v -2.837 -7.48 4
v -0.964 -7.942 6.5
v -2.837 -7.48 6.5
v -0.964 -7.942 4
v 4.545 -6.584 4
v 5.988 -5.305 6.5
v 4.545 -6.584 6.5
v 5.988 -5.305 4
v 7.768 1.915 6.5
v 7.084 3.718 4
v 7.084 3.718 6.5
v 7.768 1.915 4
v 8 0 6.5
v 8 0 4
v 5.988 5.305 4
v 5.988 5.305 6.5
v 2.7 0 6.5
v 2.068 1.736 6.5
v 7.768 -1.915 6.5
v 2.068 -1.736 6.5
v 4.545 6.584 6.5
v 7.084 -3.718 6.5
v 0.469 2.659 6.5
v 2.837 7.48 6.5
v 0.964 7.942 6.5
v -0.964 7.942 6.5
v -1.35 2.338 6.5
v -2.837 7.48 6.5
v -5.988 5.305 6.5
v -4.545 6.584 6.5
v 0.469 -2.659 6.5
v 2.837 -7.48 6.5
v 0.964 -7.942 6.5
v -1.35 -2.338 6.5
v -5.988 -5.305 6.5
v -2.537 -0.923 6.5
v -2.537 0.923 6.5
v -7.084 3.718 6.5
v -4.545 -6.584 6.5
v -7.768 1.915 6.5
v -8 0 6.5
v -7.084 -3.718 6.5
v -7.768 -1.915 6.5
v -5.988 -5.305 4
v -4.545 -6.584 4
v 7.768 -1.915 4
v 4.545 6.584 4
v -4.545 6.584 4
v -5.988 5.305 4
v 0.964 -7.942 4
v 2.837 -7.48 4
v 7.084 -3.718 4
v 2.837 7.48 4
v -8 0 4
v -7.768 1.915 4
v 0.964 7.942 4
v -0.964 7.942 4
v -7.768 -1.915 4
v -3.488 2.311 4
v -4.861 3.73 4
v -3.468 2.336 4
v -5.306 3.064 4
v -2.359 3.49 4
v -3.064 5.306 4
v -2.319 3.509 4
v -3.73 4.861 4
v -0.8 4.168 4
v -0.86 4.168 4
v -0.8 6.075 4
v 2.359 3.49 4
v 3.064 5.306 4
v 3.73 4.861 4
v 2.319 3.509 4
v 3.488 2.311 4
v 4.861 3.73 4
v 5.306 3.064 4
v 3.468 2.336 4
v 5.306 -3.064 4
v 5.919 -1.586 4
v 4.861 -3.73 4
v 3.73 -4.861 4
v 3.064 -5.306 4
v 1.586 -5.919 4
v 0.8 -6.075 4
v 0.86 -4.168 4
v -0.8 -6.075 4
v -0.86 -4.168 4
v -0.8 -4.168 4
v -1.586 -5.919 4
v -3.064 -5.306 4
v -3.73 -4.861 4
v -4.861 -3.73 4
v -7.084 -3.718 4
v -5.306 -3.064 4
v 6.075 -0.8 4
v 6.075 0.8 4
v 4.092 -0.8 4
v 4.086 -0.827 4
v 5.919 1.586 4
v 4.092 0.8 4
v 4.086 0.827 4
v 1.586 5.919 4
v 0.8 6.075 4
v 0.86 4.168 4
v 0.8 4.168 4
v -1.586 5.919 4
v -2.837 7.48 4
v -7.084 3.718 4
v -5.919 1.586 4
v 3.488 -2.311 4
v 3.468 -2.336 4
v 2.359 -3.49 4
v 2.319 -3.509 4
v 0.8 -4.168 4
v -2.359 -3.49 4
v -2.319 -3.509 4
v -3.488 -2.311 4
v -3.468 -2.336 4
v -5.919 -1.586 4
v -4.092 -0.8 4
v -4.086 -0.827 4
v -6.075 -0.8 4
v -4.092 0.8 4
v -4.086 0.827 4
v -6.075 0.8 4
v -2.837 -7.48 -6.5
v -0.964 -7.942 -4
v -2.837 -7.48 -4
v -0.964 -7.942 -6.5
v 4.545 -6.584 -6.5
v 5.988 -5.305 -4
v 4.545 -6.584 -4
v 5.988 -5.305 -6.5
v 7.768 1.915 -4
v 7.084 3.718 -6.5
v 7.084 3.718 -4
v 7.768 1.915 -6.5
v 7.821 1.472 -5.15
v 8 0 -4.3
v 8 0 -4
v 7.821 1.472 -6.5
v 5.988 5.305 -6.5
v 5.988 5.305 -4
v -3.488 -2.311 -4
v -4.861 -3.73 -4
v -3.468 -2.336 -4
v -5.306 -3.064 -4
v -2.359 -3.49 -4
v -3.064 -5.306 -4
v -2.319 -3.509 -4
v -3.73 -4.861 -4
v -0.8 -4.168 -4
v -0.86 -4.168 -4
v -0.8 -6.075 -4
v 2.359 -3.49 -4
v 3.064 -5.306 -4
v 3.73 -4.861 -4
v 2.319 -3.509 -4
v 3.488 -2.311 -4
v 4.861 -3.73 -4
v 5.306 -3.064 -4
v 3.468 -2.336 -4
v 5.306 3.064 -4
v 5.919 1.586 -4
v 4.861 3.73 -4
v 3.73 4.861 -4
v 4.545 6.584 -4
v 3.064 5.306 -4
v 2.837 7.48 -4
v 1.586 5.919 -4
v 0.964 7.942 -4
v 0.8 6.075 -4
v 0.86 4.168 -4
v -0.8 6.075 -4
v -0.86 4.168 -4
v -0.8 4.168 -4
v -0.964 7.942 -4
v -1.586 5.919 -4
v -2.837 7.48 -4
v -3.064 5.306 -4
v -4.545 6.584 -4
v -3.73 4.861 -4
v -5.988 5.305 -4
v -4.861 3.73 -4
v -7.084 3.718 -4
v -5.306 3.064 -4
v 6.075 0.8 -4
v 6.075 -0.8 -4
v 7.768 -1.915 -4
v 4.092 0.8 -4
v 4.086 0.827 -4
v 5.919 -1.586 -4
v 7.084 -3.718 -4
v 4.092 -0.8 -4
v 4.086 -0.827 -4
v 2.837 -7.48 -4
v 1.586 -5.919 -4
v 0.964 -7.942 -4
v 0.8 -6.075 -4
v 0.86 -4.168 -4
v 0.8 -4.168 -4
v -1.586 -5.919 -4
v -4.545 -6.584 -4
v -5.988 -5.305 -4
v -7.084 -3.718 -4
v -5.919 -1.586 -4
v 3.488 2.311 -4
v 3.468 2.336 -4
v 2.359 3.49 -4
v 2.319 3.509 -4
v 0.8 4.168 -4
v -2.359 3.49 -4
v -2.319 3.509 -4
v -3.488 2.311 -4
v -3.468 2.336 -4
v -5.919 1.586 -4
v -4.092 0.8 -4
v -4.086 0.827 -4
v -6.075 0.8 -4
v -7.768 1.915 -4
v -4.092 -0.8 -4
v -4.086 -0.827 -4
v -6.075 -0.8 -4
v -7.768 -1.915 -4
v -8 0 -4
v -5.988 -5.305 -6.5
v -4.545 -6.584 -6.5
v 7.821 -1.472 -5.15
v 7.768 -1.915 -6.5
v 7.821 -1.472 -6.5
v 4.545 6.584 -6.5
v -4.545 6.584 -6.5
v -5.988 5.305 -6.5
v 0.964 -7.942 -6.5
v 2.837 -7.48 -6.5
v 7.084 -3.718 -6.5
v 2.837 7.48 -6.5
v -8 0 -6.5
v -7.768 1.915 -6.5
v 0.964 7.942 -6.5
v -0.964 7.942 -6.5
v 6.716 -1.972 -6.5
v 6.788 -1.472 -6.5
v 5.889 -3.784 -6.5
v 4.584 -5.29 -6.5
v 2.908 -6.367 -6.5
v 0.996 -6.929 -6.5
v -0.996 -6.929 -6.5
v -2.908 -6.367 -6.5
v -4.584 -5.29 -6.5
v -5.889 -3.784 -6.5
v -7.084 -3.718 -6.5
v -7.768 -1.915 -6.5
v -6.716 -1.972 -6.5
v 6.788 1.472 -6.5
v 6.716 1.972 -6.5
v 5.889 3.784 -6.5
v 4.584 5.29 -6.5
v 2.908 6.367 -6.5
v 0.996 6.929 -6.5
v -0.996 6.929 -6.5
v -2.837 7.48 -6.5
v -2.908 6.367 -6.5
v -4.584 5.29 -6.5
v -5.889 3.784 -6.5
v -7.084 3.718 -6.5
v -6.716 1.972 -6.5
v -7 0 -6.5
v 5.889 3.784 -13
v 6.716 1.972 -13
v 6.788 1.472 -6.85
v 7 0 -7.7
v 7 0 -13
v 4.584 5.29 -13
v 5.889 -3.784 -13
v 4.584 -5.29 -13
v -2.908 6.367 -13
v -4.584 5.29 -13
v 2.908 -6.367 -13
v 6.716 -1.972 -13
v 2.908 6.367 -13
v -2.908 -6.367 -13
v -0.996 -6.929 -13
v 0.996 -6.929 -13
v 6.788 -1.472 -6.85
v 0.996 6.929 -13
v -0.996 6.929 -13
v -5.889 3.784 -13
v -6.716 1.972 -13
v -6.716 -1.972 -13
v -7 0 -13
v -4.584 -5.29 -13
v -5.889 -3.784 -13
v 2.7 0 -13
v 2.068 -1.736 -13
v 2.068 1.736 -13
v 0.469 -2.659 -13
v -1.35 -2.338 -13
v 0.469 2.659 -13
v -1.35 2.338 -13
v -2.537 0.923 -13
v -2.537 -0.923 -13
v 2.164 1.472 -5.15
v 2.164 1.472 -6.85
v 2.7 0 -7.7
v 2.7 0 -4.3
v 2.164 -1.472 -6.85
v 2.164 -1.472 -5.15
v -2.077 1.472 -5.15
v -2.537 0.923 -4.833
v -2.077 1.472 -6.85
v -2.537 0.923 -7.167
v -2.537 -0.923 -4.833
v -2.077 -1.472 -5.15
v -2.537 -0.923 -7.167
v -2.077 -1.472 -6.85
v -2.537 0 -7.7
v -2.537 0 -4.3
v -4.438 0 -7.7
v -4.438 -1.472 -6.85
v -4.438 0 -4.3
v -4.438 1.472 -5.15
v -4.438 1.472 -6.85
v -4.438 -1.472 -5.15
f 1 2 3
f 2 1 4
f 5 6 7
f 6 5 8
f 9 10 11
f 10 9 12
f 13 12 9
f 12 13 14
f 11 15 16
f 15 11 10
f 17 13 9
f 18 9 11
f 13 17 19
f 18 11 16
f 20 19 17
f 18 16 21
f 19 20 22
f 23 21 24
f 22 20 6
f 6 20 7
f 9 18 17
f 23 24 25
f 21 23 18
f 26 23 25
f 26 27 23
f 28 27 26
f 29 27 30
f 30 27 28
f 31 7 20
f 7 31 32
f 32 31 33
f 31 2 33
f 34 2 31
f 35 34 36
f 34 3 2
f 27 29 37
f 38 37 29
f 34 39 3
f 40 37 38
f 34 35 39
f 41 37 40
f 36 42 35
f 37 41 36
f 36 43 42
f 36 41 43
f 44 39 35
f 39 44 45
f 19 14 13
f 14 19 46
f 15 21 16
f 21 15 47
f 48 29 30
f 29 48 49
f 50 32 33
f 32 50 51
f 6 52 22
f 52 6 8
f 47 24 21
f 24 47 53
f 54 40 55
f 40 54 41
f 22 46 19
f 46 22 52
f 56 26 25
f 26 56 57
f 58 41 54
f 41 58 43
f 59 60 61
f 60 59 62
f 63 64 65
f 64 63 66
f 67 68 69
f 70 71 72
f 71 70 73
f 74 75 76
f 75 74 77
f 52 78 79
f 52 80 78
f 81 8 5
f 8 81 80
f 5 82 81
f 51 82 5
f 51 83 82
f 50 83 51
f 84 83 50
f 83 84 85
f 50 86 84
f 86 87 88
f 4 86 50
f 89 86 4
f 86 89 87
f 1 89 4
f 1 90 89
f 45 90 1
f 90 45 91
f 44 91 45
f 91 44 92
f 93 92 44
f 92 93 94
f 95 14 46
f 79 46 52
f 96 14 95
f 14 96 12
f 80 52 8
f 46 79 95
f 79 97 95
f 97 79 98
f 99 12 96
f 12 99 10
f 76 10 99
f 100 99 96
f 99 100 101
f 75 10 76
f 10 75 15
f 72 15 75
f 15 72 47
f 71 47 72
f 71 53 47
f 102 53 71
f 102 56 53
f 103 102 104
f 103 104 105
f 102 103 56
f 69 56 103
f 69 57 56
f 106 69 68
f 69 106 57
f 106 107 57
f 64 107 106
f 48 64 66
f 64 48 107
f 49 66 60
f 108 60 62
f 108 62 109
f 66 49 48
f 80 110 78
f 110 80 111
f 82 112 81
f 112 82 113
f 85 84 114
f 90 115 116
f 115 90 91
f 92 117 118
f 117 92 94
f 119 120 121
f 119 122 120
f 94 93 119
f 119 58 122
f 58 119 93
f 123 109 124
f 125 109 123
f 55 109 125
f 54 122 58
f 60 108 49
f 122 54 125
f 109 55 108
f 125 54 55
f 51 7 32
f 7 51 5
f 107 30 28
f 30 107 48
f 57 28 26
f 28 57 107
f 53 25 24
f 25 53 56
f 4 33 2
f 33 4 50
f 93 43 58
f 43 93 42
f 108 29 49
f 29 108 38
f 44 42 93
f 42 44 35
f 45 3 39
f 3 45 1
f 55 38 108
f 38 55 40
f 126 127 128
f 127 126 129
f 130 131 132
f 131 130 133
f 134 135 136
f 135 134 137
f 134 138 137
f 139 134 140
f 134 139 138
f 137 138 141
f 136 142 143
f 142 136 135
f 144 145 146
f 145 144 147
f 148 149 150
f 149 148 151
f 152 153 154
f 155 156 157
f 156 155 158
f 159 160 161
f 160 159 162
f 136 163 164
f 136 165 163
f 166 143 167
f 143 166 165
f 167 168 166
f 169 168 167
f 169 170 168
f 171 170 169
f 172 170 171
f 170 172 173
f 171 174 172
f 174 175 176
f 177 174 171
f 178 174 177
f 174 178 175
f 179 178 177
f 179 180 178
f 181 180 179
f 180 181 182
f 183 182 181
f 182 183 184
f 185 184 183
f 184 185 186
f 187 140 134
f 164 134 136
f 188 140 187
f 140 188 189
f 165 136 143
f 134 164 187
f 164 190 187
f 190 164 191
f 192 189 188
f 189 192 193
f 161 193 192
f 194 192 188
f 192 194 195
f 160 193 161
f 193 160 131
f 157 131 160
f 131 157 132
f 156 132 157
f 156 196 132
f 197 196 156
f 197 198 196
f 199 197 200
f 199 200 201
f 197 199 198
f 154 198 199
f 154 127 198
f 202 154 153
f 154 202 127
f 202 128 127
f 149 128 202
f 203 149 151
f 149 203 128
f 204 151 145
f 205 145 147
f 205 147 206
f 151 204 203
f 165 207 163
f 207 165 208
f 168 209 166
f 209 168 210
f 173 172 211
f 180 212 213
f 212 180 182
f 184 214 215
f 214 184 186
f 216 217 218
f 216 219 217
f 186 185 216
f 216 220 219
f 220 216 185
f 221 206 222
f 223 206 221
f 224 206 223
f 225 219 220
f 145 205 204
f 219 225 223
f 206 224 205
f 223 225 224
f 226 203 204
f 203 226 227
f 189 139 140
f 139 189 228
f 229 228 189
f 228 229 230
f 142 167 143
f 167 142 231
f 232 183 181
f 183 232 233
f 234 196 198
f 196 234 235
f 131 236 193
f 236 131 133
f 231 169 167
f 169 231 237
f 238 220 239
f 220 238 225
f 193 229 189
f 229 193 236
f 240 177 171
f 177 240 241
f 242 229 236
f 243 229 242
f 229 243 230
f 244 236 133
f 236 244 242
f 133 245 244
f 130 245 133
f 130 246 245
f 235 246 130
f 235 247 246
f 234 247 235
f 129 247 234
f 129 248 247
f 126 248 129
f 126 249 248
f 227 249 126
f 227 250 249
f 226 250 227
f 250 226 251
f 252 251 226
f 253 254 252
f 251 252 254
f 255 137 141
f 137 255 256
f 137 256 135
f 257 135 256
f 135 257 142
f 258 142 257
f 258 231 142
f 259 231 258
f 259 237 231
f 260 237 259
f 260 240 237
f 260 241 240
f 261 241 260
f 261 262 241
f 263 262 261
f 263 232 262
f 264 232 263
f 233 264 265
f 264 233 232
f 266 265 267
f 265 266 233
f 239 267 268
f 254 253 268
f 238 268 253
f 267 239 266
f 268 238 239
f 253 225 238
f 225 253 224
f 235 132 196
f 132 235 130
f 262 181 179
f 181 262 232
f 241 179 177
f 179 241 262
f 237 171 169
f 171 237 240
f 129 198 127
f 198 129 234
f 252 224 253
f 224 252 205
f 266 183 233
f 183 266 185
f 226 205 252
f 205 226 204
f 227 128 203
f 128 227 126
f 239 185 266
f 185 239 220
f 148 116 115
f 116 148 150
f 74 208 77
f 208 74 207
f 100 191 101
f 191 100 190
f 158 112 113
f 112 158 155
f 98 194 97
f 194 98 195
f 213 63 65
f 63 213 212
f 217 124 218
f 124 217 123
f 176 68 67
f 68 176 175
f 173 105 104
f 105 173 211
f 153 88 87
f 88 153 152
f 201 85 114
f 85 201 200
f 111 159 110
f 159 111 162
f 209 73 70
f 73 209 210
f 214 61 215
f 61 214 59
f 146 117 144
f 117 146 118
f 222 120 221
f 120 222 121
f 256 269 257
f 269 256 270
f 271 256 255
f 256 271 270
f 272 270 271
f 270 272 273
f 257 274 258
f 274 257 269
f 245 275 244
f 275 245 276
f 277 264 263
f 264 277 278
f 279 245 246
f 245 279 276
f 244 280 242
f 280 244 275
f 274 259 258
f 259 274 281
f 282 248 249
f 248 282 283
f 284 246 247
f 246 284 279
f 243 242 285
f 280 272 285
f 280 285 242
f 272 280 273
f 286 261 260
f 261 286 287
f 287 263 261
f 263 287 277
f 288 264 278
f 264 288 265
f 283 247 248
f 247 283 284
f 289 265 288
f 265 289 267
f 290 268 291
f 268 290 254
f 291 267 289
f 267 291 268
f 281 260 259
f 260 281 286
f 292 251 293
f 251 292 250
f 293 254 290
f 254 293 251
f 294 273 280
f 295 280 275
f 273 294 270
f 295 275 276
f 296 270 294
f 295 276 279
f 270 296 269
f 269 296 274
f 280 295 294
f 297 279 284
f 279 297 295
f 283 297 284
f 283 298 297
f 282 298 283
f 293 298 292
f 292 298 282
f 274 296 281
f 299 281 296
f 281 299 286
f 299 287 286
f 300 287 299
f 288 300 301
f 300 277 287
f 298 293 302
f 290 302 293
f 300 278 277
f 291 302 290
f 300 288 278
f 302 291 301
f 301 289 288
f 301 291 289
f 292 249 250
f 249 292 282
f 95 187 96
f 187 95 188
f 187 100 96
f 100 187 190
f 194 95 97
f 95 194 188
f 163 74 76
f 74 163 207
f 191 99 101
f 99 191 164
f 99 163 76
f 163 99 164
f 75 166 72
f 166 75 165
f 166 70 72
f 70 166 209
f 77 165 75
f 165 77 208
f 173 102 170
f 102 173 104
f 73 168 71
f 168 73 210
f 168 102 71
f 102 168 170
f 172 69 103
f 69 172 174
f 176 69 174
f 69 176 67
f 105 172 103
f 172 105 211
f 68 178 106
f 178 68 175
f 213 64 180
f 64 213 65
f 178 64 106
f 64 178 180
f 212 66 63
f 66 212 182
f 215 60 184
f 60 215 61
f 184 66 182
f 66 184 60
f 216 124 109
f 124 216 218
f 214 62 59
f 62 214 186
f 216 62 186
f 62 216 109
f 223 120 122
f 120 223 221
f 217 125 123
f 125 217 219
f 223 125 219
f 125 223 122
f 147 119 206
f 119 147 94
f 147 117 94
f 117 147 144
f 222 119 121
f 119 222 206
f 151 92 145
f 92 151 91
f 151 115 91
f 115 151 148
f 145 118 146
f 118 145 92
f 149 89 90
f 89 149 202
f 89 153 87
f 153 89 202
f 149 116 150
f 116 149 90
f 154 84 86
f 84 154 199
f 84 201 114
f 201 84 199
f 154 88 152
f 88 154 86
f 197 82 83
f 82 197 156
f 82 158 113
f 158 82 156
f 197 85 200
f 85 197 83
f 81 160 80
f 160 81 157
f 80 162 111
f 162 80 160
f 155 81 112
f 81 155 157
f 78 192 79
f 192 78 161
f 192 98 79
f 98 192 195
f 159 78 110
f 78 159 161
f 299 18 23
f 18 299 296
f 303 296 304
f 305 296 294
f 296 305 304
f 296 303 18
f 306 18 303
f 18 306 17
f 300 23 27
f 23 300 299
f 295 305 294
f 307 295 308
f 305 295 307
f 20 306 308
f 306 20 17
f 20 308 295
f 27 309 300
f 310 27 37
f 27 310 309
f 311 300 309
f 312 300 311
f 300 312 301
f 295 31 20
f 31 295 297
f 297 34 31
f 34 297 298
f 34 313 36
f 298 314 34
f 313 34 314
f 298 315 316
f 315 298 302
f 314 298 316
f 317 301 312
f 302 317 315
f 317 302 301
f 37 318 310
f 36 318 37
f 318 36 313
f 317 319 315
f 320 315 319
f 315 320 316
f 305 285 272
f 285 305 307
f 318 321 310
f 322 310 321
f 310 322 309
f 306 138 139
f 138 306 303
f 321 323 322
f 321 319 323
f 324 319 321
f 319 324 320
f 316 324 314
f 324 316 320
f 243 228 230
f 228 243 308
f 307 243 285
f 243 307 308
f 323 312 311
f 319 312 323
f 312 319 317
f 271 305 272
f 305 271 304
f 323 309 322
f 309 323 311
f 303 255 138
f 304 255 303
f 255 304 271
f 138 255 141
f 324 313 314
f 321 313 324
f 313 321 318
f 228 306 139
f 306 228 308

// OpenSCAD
// Parameters
tooth_count = 16; //[8:64:1]
pitch_diameter_mm = 9.75; //[5:20:0.05]
pulley_width_mm = 10; //[5:30:1]
tooth_radial_height_mm = 1.2; //[0.6:2.4:0.05]
tooth_tangential_width_mm = 1.6; //[0.8:3.2:0.05]
tooth_root_clearance_mm = 0.6; //[0.3:1.2:0.05]
bore_diameter_mm = 5; //[2:10:0.1]
tolerance_mm = 0.2; //[0:0.6:0.05]
hub_diameter_mm = 14; //[7:28:0.5]
hub_length_mm = 8; //[0:25:1]
hub_enabled = 1; //[0:1:1]
flange_diameter_mm = 16; //[10:32:0.5]
flange_thickness_mm = 1.5; //[0:4:0.1]
flanges_enabled = 1; //[0:1:1]
set_screw_count = 1; //[0:2:1]
set_screw_hole_diameter_mm = 3; //[1.5:6:0.1]
set_screw_z_offset_mm = 3; //[0:20:0.5]
overlap_mm = 1; //[0.5:2:0.1]

// Pulley - complete geometry
module pulley() {
  color("Silver") {
    // Pulley body
    cylinder(h=pulley_width_mm, r=pitch_diameter_mm/2 - tooth_root_clearance_mm, center=true);
    
    // Hub
    if (hub_enabled) {
      translate([0, 0, -pulley_width_mm/2 - hub_length_mm/2 + overlap_mm/2])
        cylinder(h=hub_length_mm + overlap_mm, r=hub_diameter_mm/2, center=true);
    }
    
    // Flanges
    if (flanges_enabled) {
      translate([0, 0, pulley_width_mm/2 + flange_thickness_mm/2 - overlap_mm/2])
        cylinder(h=flange_thickness_mm + overlap_mm, r=flange_diameter_mm/2, center=true);
      translate([0, 0, -pulley_width_mm/2 - flange_thickness_mm/2 + overlap_mm/2])
        cylinder(h=flange_thickness_mm + overlap_mm, r=flange_diameter_mm/2, center=true);
    }
  }
}

// Printed Pulley Teeth - complete geometry
module printed_pulley_teeth() {
  for (i = [0:tooth_count-1]) {
    rotate([0, 0, i*360/tooth_count]) {
      translate([(pitch_diameter_mm/2) + (tooth_radial_height_mm + overlap_mm)/2 - overlap_mm, 0, 0])
        cube([tooth_radial_height_mm + overlap_mm, tooth_tangential_width_mm, pulley_width_mm], center=true);
    }
  }
}

// Printed Pulley Teeth From Profile - complete geometry
module printed_pulley_teeth_from_profile() {
  printed_pulley_teeth();
}

// Printed Pulley GT2 Teeth - complete geometry
module printed_pulley_GT2_teeth() {
  union() {
    pulley();
    printed_pulley_teeth();
  }
}

// Assembly
module assembly() {
  difference() {
    printed_pulley_GT2_teeth();
    // Center bore
    translate([0, 0, -(hub_length_mm*hub_enabled)/2])
      cylinder(h=pulley_width_mm + (hub_length_mm*hub_enabled) + (2*flange_thickness_mm*flanges_enabled) + 4*overlap_mm, 
               r=(bore_diameter_mm/2) + tolerance_mm, center=true);
    
    // Set screw holes
    if (set_screw_count >= 1) {
      translate([(hub_diameter_mm/2) * 0.5, 0, -pulley_width_mm/2 - (hub_length_mm*hub_enabled)/2 + set_screw_z_offset_mm])
        rotate([0, 90, 0])
        cylinder(h=(hub_diameter_mm/2) + (pitch_diameter_mm/2) + 4*overlap_mm, 
                 r=(set_screw_hole_diameter_mm/2 + tolerance_mm), center=true);
    }
    if (set_screw_count >= 2) {
      translate([0, (hub_diameter_mm/2) * 0.5, -pulley_width_mm/2 - (hub_length_mm*hub_enabled)/2 + set_screw_z_offset_mm])
        rotate([90, 0, 0])
        cylinder(h=(hub_diameter_mm/2) + (pitch_diameter_mm/2) + 4*overlap_mm, 
                 r=(set_screw_hole_diameter_mm/2 + tolerance_mm), center=true);
    }
  }
}

assembly();
